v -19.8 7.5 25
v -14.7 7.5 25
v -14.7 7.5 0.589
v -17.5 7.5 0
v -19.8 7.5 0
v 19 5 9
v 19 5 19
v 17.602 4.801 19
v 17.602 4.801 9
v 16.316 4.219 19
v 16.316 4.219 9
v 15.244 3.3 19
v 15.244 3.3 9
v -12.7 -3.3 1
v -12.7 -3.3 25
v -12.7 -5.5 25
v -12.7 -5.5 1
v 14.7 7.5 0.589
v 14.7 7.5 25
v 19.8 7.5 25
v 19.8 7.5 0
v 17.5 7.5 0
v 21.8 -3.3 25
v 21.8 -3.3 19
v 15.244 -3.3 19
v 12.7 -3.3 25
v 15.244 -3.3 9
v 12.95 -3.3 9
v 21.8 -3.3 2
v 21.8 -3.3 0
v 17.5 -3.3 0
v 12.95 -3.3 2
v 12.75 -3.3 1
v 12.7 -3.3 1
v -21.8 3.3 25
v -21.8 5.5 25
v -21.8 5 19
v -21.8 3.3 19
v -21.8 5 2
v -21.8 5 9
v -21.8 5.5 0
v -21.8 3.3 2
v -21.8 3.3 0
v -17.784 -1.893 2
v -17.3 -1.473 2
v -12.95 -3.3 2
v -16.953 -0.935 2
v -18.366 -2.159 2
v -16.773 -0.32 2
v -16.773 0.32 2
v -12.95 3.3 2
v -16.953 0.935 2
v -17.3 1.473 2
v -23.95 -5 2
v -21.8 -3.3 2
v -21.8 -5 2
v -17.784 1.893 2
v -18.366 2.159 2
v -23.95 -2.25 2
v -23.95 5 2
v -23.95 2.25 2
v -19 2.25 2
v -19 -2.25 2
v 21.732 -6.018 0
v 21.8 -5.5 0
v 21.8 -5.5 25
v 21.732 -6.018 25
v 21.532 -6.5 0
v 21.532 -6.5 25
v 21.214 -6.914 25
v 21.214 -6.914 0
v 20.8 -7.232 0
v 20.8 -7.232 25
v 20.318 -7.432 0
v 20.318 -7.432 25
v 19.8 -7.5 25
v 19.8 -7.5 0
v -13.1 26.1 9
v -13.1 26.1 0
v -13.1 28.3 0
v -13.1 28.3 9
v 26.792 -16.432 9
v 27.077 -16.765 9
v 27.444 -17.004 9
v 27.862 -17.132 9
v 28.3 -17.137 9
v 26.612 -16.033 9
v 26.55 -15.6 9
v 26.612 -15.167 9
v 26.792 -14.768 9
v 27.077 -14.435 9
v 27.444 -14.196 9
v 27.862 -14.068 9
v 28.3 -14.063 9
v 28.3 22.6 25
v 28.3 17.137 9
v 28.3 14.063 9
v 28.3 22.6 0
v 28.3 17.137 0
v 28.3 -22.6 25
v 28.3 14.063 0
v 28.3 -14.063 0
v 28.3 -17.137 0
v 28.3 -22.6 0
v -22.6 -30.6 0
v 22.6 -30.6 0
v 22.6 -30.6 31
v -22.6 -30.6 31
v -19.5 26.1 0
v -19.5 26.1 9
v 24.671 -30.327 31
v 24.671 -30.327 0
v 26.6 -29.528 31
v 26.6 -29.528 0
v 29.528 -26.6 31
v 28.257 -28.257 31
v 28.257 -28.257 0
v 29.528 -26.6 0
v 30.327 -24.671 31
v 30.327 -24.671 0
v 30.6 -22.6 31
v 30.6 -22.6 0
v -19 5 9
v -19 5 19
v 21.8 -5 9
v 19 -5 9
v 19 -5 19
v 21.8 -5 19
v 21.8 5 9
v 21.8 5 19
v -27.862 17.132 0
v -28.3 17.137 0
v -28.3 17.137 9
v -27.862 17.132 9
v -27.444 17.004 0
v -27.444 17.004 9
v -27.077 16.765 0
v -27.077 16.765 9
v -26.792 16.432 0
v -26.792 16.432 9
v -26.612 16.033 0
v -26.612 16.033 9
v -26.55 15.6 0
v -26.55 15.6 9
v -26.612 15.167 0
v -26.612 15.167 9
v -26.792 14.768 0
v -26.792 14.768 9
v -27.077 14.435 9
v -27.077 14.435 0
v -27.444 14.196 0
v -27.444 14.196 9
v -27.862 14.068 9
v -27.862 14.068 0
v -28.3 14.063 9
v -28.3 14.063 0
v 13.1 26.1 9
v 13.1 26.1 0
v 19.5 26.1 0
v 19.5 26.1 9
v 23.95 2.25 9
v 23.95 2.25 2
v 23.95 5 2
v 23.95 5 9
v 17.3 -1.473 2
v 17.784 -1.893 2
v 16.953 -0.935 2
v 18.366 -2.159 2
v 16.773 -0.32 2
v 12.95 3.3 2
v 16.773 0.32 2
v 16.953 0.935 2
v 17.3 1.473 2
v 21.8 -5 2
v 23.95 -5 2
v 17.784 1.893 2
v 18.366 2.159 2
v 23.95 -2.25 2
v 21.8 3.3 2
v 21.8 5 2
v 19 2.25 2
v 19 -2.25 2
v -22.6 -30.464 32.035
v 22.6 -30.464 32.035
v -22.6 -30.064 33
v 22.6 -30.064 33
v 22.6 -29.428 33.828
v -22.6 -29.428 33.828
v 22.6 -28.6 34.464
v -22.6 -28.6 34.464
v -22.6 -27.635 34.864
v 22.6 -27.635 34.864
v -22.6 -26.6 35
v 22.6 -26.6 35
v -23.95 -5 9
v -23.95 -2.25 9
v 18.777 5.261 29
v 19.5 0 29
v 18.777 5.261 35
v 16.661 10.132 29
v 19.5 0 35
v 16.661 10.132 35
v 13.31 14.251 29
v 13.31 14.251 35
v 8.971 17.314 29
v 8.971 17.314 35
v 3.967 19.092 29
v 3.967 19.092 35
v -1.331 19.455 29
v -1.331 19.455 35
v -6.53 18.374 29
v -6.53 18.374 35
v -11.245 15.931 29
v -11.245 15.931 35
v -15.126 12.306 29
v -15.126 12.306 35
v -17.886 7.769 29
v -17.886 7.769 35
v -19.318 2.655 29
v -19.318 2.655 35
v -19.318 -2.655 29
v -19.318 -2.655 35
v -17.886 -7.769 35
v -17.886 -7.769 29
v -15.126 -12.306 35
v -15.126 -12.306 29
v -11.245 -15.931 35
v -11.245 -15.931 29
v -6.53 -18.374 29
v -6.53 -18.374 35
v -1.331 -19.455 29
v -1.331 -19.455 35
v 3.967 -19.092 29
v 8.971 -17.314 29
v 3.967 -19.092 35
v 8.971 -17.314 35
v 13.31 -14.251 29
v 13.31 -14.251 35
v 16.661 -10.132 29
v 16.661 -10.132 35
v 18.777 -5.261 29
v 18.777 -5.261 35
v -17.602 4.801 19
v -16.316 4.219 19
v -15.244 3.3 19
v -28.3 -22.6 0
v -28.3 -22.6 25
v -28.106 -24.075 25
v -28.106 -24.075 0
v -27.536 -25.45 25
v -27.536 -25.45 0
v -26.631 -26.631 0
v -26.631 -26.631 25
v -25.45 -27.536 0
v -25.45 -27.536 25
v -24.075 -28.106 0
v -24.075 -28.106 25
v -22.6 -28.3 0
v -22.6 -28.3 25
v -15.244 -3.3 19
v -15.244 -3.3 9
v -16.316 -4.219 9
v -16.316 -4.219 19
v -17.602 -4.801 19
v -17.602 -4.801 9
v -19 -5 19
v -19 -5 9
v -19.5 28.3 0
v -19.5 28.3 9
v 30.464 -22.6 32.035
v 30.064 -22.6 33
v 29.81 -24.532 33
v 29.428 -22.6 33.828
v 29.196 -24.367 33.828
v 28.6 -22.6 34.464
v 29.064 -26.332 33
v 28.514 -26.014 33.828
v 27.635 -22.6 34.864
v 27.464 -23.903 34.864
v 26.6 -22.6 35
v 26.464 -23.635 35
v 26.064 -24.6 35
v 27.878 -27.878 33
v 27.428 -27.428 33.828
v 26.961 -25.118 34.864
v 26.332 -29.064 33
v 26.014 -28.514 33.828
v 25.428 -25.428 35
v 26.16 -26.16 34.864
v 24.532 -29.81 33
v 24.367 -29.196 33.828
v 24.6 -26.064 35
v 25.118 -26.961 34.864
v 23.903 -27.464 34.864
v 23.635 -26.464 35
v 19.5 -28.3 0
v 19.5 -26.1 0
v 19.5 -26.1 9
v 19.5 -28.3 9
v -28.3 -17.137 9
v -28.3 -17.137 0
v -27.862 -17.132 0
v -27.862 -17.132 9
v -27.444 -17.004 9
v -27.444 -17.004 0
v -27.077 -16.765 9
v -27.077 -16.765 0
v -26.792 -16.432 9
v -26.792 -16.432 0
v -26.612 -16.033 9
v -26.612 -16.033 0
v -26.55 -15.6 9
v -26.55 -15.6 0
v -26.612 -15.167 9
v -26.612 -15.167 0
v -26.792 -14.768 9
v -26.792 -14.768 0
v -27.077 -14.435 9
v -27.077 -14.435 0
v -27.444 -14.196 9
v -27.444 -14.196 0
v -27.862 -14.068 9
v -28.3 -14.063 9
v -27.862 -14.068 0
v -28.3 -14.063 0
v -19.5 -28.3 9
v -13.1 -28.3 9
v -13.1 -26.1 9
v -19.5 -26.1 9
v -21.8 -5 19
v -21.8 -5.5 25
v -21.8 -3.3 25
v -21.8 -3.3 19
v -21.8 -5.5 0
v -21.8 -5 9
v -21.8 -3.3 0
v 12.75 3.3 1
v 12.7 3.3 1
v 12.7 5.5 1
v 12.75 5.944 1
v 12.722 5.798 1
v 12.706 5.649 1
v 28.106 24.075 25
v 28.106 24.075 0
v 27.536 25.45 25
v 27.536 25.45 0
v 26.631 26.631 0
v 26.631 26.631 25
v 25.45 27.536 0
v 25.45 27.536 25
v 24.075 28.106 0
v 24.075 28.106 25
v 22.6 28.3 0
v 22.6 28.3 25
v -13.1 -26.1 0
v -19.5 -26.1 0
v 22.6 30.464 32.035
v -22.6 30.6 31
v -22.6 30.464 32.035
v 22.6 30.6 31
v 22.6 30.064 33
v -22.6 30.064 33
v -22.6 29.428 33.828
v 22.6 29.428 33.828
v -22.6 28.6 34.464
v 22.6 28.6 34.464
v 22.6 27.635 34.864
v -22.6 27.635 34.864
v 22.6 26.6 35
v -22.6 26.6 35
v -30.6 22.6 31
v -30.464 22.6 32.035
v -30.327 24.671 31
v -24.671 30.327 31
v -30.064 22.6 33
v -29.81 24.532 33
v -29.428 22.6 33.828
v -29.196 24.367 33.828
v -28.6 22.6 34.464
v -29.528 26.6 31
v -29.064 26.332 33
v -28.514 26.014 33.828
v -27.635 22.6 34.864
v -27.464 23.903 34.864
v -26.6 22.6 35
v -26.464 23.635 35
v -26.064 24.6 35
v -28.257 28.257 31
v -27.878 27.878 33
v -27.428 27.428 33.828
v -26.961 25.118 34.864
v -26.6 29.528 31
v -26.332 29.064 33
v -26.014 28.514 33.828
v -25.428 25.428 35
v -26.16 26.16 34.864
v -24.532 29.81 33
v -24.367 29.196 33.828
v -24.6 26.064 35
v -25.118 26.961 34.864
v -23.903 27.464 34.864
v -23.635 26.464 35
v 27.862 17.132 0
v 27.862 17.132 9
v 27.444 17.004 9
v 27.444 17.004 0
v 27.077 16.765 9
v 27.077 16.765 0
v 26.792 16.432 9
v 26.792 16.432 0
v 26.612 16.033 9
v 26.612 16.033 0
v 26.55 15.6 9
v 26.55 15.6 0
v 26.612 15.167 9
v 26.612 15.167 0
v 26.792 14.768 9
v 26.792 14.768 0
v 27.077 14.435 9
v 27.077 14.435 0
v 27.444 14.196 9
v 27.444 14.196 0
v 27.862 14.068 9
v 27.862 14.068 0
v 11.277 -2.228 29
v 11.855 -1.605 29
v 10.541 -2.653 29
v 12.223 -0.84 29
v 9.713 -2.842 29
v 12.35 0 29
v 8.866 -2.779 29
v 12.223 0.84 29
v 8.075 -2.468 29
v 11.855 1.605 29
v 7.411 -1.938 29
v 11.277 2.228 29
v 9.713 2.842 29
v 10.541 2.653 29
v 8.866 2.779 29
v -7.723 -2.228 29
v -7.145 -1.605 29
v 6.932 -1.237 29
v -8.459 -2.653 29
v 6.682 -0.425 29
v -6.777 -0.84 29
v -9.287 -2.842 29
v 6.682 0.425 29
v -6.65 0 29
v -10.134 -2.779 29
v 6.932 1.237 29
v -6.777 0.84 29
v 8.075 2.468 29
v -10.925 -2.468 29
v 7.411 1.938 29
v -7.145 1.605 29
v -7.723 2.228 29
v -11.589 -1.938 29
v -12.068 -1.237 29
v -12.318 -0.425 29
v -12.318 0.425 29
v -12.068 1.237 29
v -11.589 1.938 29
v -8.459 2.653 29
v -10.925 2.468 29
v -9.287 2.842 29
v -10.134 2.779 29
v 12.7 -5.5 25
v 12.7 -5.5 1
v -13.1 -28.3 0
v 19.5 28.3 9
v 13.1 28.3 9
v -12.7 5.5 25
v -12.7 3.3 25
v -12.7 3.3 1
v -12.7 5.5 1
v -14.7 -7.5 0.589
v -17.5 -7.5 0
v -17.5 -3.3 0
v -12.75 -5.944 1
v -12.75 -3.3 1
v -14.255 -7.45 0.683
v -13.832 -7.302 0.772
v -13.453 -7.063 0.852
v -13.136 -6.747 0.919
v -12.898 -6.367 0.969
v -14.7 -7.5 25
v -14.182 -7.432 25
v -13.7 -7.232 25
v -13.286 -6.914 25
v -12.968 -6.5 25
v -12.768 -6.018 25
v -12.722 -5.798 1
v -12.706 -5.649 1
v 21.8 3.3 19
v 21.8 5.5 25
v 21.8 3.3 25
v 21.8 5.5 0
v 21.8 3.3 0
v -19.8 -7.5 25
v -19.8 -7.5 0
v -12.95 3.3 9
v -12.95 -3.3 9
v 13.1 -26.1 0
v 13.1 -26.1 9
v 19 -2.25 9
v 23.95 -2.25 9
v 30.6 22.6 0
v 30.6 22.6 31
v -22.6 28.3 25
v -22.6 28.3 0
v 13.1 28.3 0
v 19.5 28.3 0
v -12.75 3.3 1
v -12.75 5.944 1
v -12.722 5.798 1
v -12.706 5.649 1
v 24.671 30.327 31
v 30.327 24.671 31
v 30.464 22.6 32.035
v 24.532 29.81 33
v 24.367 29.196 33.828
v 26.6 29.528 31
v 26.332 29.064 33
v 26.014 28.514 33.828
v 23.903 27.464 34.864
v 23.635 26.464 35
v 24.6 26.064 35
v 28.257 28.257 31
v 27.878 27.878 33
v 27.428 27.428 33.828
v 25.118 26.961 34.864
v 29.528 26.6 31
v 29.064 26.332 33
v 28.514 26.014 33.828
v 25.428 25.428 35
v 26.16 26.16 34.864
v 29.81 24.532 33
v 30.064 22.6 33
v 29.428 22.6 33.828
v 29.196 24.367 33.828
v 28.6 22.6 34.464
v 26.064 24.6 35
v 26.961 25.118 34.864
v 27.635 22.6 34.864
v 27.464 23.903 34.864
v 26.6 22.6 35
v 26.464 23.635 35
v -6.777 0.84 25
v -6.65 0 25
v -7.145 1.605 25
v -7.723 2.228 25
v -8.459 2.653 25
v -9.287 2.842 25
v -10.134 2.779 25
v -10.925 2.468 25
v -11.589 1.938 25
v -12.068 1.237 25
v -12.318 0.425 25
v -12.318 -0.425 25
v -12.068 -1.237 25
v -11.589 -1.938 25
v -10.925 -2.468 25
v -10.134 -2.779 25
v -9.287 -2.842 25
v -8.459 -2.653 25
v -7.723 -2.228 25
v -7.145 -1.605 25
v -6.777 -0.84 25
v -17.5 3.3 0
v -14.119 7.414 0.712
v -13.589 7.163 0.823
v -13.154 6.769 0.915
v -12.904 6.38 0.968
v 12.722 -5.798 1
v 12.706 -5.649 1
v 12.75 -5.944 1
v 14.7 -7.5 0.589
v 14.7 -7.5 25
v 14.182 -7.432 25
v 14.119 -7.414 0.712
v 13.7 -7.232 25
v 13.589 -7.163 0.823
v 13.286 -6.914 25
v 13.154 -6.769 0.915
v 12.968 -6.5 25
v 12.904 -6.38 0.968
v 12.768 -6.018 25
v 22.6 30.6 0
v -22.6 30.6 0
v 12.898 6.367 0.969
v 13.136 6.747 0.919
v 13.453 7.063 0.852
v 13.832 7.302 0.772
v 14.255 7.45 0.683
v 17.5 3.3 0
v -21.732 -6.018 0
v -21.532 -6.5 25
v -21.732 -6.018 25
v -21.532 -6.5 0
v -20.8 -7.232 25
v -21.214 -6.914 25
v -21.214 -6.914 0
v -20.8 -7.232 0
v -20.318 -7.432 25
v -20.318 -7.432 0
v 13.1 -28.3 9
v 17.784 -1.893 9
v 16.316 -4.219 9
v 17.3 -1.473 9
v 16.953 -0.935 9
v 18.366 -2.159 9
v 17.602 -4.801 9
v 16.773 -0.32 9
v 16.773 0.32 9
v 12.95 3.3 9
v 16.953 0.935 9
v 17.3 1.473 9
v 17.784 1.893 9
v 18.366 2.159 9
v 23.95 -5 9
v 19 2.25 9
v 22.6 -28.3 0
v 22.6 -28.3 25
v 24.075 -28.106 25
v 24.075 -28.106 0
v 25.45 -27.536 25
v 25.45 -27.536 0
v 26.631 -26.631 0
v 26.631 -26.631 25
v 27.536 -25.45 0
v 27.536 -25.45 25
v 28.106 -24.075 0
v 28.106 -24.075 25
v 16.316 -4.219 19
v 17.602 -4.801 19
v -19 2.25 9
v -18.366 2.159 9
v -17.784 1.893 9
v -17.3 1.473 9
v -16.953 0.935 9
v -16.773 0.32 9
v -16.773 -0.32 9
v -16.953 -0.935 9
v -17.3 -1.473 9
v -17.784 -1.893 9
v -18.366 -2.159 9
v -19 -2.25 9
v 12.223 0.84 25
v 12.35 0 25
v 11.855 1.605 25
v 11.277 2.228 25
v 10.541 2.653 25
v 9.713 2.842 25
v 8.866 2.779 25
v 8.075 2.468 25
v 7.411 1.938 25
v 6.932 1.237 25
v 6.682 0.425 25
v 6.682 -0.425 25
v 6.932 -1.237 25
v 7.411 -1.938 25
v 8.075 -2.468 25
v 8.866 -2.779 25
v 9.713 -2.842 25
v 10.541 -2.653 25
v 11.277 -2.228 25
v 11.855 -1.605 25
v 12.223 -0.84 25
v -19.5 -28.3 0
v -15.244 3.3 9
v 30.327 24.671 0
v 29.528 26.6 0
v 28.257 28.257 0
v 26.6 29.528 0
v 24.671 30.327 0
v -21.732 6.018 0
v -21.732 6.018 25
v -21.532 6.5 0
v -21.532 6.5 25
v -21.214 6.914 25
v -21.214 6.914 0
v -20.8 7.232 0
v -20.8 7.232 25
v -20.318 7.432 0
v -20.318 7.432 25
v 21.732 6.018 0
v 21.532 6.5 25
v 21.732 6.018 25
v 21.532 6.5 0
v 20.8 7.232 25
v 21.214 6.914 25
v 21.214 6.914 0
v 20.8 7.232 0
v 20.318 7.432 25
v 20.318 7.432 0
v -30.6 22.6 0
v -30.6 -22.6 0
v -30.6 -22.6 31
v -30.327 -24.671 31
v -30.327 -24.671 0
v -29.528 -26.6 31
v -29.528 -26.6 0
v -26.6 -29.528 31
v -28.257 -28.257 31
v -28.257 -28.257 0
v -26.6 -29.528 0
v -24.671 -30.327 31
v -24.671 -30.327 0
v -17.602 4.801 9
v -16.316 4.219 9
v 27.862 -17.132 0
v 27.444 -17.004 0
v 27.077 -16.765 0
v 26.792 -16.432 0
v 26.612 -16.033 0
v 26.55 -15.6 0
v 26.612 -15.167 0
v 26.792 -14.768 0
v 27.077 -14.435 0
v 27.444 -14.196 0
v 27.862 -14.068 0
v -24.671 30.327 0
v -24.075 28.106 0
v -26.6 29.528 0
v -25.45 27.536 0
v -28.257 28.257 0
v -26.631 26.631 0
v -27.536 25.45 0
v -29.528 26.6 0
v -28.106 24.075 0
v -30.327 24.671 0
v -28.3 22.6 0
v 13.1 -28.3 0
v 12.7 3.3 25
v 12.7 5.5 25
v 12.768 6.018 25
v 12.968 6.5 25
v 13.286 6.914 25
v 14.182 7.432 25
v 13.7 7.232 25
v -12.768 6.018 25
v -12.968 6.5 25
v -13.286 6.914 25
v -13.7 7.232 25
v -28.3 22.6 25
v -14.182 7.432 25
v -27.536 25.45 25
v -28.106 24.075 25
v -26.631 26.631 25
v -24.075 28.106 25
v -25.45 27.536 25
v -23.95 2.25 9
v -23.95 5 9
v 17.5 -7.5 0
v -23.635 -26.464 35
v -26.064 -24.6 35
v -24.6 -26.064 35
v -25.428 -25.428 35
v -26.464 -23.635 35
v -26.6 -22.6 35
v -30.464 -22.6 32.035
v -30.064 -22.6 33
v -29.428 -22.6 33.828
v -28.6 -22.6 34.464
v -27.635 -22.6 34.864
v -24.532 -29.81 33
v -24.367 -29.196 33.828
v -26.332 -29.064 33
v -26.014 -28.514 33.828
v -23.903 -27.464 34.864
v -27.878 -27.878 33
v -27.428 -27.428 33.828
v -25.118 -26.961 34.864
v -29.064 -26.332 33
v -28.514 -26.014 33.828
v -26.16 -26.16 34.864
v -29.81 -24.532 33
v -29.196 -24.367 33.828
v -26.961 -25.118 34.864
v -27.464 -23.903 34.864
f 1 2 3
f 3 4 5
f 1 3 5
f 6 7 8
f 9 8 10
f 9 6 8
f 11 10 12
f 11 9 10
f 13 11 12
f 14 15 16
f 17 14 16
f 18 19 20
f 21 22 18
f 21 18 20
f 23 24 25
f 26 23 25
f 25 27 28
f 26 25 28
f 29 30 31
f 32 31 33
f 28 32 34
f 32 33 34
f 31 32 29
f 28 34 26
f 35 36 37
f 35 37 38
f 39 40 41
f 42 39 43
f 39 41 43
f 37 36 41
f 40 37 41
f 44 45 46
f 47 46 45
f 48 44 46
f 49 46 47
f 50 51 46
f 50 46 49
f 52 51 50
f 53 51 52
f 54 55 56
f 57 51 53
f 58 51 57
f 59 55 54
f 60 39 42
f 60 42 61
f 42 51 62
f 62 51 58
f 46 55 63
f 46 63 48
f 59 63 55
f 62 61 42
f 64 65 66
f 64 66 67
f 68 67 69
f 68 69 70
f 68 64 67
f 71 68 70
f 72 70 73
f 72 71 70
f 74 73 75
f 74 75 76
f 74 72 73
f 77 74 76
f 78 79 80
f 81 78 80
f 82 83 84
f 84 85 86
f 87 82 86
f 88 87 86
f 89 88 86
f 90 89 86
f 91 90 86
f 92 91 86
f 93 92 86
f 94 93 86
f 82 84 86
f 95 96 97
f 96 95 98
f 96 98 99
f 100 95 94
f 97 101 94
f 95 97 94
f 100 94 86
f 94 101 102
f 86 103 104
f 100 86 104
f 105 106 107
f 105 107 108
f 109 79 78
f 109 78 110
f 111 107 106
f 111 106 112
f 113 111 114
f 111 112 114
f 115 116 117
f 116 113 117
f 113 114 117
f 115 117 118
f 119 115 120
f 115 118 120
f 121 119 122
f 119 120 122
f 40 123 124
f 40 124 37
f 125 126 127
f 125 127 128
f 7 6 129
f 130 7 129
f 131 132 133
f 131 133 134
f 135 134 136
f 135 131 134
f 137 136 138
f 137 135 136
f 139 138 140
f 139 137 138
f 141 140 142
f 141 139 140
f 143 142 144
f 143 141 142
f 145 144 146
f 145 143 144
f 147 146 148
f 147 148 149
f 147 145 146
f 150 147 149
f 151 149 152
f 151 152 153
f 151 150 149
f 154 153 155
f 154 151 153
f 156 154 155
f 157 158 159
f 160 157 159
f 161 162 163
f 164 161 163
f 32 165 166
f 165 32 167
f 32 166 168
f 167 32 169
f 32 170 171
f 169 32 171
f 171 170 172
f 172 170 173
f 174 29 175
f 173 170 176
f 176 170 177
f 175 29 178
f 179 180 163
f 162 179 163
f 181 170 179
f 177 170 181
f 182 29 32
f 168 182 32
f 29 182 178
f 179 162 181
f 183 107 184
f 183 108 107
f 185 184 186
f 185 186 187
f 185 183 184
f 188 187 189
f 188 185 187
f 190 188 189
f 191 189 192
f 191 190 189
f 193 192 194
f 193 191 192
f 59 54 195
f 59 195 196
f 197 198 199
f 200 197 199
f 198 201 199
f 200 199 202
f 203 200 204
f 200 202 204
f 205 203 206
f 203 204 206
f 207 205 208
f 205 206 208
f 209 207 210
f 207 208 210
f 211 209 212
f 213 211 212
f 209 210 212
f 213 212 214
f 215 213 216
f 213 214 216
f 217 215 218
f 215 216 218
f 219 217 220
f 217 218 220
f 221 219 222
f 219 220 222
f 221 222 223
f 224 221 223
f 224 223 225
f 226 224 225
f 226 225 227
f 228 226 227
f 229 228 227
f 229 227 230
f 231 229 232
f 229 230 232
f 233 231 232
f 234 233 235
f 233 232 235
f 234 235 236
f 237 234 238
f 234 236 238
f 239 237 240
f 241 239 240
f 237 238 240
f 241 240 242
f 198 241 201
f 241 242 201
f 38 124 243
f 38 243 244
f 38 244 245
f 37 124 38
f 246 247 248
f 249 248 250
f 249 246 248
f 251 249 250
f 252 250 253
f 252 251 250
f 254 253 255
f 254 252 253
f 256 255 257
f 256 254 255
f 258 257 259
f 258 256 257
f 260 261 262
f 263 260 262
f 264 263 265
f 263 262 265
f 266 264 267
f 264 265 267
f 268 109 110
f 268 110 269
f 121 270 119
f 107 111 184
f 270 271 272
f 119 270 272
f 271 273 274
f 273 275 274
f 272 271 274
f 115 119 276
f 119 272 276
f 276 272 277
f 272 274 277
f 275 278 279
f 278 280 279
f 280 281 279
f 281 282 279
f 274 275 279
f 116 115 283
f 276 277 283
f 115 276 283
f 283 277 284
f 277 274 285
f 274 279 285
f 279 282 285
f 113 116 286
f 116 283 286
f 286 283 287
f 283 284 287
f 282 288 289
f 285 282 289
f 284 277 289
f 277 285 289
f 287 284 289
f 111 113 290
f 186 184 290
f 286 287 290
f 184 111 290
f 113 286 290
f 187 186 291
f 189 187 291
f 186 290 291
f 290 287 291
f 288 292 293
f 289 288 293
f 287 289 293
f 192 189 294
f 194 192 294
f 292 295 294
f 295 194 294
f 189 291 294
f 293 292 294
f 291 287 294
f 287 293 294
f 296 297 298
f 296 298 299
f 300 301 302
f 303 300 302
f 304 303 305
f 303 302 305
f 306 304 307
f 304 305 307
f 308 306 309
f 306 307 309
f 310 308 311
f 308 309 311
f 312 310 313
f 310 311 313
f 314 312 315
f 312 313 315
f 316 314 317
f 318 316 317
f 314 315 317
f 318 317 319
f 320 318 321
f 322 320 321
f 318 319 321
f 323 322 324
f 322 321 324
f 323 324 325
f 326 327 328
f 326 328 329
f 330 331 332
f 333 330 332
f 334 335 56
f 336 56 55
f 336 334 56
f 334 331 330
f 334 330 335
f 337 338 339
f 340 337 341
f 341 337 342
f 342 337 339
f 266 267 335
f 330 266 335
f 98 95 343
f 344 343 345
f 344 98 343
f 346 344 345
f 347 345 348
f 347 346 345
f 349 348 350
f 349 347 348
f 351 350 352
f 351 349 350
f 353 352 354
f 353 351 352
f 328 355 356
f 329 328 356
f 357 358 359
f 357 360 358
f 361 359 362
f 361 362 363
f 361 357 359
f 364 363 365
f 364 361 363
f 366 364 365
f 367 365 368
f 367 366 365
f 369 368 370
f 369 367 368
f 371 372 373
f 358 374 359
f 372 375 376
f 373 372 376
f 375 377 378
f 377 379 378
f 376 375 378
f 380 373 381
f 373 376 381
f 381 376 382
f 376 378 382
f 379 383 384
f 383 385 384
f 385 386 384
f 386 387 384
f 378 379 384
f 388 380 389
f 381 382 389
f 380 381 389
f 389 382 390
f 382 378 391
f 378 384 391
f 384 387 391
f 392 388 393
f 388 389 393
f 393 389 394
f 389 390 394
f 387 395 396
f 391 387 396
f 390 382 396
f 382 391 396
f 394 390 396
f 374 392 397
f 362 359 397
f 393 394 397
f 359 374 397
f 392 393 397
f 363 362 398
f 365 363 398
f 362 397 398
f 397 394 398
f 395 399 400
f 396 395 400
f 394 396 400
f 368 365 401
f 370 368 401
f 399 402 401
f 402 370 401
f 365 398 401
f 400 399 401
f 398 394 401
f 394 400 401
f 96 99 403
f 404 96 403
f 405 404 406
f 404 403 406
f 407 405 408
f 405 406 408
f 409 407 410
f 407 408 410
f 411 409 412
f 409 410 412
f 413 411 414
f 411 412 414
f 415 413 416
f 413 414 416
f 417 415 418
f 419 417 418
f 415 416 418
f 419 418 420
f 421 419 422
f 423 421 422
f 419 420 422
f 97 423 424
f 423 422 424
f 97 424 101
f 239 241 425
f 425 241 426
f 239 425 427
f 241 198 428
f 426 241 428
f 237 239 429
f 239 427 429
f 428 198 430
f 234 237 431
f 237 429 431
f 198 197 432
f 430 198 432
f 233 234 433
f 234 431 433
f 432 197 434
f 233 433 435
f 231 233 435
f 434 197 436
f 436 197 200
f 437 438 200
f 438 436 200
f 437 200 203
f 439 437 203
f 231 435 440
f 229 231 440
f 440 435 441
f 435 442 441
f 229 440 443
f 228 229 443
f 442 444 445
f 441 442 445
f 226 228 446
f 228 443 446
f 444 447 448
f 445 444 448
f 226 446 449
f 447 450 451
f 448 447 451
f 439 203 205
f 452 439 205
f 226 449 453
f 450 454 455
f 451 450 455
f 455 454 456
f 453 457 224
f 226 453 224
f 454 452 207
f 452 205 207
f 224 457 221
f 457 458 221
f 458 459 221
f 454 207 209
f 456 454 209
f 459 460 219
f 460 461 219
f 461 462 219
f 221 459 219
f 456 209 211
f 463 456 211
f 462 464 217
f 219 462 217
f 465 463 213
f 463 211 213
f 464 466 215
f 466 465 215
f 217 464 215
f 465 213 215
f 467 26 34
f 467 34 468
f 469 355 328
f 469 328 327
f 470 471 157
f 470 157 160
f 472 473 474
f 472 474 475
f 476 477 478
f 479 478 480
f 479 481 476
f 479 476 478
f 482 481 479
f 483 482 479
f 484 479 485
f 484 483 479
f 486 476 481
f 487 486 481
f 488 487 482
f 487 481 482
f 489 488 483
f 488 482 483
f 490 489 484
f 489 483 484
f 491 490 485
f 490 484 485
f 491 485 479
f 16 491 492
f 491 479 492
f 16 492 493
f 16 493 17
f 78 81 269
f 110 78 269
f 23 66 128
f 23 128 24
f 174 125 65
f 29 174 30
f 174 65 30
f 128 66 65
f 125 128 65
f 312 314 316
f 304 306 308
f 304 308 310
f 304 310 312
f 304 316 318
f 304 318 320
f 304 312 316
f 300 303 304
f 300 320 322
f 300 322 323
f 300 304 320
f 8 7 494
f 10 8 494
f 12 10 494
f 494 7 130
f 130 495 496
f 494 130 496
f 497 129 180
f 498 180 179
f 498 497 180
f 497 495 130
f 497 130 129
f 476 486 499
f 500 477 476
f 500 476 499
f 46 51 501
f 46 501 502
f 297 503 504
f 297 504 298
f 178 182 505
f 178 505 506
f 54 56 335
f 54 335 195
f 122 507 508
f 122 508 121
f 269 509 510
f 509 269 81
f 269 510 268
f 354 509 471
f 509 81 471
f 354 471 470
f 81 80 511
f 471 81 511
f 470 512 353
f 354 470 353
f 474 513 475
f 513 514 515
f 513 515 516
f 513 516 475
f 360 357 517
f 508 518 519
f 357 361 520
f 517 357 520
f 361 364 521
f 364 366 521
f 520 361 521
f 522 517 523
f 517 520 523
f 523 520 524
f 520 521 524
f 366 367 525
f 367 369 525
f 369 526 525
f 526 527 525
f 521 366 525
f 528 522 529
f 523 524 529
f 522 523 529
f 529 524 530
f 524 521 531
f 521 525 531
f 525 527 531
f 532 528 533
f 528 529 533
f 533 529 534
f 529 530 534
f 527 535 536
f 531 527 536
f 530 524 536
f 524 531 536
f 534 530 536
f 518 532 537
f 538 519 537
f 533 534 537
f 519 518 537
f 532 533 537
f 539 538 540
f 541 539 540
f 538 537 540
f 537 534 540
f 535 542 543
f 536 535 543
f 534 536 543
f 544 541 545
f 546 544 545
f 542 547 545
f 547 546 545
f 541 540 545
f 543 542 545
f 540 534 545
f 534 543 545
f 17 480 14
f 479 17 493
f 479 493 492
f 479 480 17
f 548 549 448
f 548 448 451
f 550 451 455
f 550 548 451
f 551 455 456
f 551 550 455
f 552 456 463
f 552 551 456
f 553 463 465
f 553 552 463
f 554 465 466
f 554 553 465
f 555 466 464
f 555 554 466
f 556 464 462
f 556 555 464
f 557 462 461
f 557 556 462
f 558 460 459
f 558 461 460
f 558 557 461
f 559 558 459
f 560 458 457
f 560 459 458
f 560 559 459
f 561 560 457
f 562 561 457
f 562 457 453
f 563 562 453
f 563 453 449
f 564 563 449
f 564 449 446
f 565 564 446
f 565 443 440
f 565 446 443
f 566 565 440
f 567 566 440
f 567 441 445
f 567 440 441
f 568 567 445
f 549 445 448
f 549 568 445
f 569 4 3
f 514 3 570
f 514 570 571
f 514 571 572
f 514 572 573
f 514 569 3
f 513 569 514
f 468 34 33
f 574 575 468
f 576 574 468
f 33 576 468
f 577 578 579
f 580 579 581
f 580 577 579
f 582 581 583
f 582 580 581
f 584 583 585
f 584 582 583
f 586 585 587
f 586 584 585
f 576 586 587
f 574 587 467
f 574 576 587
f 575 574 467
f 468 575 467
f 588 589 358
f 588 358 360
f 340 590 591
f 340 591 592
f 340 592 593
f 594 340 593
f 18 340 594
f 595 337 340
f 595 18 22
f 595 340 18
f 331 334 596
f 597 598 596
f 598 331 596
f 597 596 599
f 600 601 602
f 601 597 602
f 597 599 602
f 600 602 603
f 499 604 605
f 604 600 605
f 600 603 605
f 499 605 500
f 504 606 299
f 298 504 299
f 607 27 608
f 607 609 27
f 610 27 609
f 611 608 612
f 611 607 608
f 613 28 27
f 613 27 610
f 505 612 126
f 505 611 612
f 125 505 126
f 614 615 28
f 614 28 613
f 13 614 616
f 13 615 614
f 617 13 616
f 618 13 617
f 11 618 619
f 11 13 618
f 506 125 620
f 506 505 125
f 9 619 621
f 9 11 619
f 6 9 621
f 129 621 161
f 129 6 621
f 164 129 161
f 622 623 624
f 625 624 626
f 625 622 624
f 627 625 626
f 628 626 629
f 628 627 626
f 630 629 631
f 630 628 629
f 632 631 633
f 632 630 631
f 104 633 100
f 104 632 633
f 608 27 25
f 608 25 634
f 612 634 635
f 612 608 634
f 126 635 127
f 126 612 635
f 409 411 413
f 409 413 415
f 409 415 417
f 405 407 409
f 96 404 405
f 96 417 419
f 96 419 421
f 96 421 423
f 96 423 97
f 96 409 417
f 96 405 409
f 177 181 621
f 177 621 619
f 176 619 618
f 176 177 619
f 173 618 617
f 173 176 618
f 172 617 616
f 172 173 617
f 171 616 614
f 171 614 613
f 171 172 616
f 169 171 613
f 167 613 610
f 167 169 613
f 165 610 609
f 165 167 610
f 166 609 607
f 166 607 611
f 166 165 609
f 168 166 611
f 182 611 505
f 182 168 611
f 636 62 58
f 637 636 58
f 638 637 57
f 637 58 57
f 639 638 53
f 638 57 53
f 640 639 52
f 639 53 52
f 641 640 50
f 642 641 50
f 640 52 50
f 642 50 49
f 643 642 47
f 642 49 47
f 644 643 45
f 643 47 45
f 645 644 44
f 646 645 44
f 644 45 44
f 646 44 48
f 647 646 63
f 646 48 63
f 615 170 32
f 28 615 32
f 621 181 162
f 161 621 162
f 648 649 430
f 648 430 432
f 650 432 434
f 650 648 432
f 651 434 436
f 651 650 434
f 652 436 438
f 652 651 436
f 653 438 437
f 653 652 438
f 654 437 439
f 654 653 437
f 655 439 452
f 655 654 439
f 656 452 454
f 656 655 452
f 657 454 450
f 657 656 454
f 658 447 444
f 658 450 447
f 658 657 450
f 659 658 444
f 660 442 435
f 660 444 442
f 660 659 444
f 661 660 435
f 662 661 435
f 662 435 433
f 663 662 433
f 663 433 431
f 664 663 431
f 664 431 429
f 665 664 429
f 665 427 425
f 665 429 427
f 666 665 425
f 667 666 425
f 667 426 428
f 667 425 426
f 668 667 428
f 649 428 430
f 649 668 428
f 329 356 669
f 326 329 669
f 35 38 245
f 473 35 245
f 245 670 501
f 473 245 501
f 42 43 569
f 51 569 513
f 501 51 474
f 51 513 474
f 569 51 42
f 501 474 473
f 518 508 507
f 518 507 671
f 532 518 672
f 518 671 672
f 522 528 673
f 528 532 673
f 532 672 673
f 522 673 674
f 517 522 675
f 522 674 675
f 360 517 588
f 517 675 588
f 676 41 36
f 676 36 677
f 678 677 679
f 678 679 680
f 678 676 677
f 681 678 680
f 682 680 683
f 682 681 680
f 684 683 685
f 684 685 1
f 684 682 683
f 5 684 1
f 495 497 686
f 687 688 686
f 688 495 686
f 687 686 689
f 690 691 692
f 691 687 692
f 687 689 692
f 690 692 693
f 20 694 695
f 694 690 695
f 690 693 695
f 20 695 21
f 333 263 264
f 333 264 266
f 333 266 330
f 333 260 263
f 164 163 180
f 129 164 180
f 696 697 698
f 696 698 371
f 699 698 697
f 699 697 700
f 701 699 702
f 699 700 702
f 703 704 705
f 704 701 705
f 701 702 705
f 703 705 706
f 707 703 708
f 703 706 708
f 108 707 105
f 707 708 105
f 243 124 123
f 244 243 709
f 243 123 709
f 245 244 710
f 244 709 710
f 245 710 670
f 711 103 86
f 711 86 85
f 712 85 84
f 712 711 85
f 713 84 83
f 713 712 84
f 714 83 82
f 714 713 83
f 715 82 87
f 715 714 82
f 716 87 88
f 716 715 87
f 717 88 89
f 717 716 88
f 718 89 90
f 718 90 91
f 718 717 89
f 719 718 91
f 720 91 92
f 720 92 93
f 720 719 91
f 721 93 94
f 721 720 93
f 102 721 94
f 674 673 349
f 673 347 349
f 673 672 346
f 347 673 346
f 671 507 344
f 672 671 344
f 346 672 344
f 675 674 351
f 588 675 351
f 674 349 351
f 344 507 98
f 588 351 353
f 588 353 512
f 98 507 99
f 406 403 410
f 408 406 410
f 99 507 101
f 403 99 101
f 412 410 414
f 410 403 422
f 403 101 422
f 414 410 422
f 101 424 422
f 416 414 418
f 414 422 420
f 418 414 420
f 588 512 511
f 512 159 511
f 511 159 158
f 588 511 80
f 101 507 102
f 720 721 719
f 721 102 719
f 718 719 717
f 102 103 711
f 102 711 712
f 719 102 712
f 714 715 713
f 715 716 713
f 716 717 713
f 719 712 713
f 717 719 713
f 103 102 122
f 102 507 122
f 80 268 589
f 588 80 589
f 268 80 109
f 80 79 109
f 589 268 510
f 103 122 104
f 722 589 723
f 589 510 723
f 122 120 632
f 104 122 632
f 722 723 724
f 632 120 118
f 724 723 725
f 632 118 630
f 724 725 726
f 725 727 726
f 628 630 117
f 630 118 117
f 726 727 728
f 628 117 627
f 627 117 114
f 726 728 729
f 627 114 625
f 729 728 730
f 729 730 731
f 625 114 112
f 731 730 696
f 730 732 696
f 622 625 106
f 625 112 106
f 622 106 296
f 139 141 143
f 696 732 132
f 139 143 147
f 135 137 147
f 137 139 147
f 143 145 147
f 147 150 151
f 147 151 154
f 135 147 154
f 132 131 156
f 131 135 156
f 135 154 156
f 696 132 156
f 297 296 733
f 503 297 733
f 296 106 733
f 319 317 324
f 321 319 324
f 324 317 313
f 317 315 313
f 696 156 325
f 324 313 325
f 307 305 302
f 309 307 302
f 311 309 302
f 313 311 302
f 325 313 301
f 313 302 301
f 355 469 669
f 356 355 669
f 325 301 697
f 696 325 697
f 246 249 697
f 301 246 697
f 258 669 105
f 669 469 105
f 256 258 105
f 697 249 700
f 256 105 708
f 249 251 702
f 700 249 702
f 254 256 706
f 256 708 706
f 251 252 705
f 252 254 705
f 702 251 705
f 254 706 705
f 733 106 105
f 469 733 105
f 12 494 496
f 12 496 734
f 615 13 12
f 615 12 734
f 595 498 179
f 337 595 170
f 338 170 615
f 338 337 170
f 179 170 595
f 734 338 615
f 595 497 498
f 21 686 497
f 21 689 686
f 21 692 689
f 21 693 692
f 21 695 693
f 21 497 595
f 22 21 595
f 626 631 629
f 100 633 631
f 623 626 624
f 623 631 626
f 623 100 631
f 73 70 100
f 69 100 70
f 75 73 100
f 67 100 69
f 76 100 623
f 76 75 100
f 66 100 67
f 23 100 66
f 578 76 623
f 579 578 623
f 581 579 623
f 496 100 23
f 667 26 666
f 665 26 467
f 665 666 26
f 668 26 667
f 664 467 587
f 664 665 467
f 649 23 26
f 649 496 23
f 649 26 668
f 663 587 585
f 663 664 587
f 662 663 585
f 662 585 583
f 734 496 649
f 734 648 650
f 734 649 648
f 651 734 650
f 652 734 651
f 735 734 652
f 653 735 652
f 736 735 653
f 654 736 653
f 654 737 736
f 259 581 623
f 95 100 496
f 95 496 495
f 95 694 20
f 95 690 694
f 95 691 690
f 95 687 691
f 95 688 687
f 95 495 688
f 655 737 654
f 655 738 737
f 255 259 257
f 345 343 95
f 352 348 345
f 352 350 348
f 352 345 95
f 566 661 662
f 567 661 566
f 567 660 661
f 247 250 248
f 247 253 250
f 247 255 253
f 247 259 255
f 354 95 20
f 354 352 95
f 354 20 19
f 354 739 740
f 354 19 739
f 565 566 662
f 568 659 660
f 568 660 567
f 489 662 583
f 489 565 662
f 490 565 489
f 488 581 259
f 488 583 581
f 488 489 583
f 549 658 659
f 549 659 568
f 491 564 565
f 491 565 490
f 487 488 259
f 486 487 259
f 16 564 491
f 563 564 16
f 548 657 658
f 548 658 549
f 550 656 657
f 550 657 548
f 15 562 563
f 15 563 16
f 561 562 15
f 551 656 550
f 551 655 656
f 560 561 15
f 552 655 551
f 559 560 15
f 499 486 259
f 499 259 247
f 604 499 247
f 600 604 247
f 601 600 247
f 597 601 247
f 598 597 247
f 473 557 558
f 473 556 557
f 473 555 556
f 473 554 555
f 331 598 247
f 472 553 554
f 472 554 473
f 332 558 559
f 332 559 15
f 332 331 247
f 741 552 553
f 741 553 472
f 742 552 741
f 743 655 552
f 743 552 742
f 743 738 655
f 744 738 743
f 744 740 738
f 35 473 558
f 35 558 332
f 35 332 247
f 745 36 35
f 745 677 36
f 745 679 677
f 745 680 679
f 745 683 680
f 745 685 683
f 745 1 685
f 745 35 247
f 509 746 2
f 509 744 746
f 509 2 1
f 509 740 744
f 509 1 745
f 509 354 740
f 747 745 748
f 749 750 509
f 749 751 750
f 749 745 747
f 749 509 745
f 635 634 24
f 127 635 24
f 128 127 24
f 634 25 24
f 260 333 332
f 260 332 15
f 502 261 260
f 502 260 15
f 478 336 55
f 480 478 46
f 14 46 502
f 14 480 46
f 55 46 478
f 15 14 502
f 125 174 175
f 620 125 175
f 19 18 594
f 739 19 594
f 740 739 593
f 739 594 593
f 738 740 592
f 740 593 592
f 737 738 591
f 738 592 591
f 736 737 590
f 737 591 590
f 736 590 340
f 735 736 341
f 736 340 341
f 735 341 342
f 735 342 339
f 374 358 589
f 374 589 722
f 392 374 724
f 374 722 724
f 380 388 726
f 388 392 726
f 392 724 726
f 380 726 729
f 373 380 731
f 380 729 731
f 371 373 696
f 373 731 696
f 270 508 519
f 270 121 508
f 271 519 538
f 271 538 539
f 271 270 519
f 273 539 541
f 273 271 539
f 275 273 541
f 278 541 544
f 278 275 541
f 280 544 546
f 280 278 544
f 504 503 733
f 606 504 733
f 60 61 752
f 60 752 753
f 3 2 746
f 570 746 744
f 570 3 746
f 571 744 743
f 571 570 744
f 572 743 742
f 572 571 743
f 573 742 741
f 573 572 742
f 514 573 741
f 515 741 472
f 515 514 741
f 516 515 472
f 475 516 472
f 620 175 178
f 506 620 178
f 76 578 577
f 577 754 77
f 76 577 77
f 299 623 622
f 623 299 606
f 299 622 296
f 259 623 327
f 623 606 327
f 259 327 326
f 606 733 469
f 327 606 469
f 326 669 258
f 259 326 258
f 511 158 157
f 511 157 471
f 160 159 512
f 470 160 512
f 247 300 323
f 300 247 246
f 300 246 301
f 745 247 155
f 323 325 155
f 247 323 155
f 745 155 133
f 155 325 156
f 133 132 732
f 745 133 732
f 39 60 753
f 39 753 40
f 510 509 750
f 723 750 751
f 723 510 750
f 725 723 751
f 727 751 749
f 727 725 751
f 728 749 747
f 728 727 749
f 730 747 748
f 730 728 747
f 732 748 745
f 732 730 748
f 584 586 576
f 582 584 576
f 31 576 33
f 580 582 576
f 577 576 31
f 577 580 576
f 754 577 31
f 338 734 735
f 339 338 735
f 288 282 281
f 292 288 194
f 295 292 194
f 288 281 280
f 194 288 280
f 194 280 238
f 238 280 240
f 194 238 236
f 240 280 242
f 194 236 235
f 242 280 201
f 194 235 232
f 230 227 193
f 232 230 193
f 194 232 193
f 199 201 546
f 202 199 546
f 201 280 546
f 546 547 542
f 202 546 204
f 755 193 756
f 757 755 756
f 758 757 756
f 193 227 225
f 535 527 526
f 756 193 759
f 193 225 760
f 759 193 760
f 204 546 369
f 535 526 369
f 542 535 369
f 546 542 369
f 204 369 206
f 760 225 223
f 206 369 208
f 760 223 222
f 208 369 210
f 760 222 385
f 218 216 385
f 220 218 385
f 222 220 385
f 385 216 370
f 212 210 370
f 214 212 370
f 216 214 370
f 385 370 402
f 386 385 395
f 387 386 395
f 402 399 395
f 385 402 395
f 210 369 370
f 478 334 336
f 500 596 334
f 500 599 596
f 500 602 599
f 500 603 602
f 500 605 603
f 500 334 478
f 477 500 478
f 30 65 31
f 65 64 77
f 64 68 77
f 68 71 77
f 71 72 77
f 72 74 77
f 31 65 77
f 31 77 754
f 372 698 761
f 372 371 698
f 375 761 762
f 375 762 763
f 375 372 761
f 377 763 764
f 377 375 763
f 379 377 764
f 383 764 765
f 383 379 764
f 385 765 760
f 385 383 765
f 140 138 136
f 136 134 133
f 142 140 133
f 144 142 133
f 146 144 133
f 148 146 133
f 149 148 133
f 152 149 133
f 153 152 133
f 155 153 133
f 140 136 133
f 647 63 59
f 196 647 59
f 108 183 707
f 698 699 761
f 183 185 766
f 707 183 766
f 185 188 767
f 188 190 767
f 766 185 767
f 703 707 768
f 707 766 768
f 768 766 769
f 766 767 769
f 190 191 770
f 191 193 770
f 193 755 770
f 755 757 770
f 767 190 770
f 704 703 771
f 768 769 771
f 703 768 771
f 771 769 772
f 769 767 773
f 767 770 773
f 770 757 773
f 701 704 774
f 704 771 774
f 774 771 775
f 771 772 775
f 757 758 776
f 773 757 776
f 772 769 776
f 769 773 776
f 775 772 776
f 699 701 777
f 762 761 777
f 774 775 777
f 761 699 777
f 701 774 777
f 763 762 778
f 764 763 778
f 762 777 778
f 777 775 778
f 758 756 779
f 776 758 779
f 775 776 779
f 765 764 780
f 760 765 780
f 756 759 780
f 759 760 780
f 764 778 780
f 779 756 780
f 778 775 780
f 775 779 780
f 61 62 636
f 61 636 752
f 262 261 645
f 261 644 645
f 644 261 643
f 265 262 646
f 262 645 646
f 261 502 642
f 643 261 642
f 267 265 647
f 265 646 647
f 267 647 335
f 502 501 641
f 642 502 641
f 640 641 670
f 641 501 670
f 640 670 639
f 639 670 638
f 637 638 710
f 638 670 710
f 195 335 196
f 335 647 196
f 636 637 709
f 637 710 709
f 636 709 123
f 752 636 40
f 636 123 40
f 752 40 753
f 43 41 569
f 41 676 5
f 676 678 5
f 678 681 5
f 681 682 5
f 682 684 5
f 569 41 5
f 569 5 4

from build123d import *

# Parameters (mm, degrees)
PAD_DEPTH               = 35
POCKET_DEPTH            = 25
SKETCH002_W             = 6.4
SKETCH002_H             = 2.5
PAD001_DEPTH            = 9
SKETCH003_R             = 1.55
PAD002_DEPTH            = 9
PAD003_DEPTH            = 33
SKETCH002_MIRRORED_2_W  = 6.4
SKETCH002_MIRRORED_2_H  = 2.5
PAD001_MIRRORED_2_DEPTH = 9
PAD003_MIRRORED_2_DEPTH = 33
SKETCH003_MIRRORED_2_R  = 1.55
PAD002_MIRRORED_2_DEPTH = 9
POCKET001_DEPTH         = 10
PAD004_DEPTH            = 7
POCKET002_DEPTH         = 10
SKETCH008_W             = 19.5
SKETCH008_H             = 6
SKETCH009_R             = 2.85
POCKET003_DEPTH         = 0.001
POCKET003_DEPTH_BACK    = -35.001
FILLET_R                = 4


with BuildPart() as part:
    # Sketch → Pad (new body)
    with BuildSketch(Plane.XY):
        with BuildLine():
            Line((-22.6, 30.6), (22.6, 30.6))
            ThreePointArc((30.6, 22.6), (28.256854, 28.256854), (22.6, 30.6))
            Line((30.6, 22.6), (30.6, -22.6))
            ThreePointArc((22.6, -30.6), (28.256854, -28.256854), (30.6, -22.6))
            Line((22.6, -30.6), (-22.6, -30.6))
            ThreePointArc((-30.6, -22.6), (-28.256854, -28.256854), (-22.6, -30.6))
            Line((-30.6, -22.6), (-30.6, 22.6))
            ThreePointArc((-22.6, 30.6), (-28.256854, 28.256854), (-30.6, 22.6))
        make_face()
    extrude(amount=PAD_DEPTH)

    # Sketch001 → Pocket (cut)
    with BuildSketch(Plane.XY):
        with BuildLine():
            Line((-22.6, 28.3), (22.6, 28.3))
            ThreePointArc((28.3, 22.6), (26.630509, 26.630509), (22.6, 28.3))
            Line((28.3, 22.6), (28.3, -22.6))
            ThreePointArc((22.6, -28.3), (26.630509, -26.630509), (28.3, -22.6))
            Line((22.6, -28.3), (-22.6, -28.3))
            ThreePointArc((-28.3, -22.6), (-26.630509, -26.630509), (-22.6, -28.3))
            Line((-28.3, -22.6), (-28.3, 22.6))
            ThreePointArc((-22.6, 28.3), (-26.630509, 26.630509), (-28.3, 22.6))
        make_face()
    extrude(amount=POCKET_DEPTH, mode=Mode.SUBTRACT)

    # Sketch002 → Pad001 (join)
    with BuildSketch(Plane.XY):
        with Locations((16.3, 27.35)):
            Rectangle(SKETCH002_W, SKETCH002_H)
    pad001 = extrude(amount=PAD001_DEPTH)

    # Sketch003 → Pad002 (join)
    with BuildSketch(Plane.XY):
        with Locations((28.1, 15.6)):
            Circle(SKETCH003_R)
    pad002 = extrude(amount=PAD002_DEPTH)

    # Sketch004 → Pad003 (join)
    with BuildSketch(Plane.XY):
        with BuildLine():
            Line((21.8, 3.3), (12.7, 3.3))
            Line((12.7, 3.3), (12.7, 5.5))
            ThreePointArc((14.7, 7.5), (13.285786, 6.914214), (12.7, 5.5))
            Line((14.7, 7.5), (19.8, 7.5))
            ThreePointArc((21.8, 5.5), (21.214214, 6.914214), (19.8, 7.5))
            Line((21.8, 5.5), (21.8, 3.3))
        make_face()
    pad003 = extrude(amount=PAD003_DEPTH)

    # Sketch002 Mirrored 2 → Pad001 Mirrored 2 (add)
    with BuildSketch(Plane(origin=(0, 0, 0), x_dir=(-1, 0, 0), z_dir=(0, 0, -1))):
        with Locations((16.3, 27.35)):
            Rectangle(SKETCH002_MIRRORED_2_W, SKETCH002_MIRRORED_2_H)
    pad001_mirrored_2 = extrude(amount=-PAD001_MIRRORED_2_DEPTH)

    # Sketch004 Mirrored 2 → Pad003 Mirrored 2 (add)
    with BuildSketch(Plane(origin=(0, 0, 0), x_dir=(-1, 0, 0), z_dir=(0, 0, -1))):
        with BuildLine():
            Line((21.8, 3.3), (12.7, 3.3))
            Line((12.7, 3.3), (12.7, 5.5))
            ThreePointArc((14.7, 7.5), (13.285786, 6.914214), (12.7, 5.5))
            Line((14.7, 7.5), (19.8, 7.5))
            ThreePointArc((21.8, 5.5), (21.214214, 6.914214), (19.8, 7.5))
            Line((21.8, 5.5), (21.8, 3.3))
        make_face()
    pad003_mirrored_2 = extrude(amount=-PAD003_MIRRORED_2_DEPTH)

    # Sketch003 Mirrored 2 → Pad002 Mirrored 2 (add)
    with BuildSketch(Plane(origin=(0, 0, 0), x_dir=(-1, 0, 0), z_dir=(0, 0, -1))):
        with Locations((28.1, 15.6)):
            Circle(SKETCH003_MIRRORED_2_R)
    pad002_mirrored_2 = extrude(amount=-PAD002_MIRRORED_2_DEPTH)

    # Mirrored001: Pad001, Pad003, Pad002, Pad001 Mirrored 2, Pad003 Mirrored 2, Pad002 Mirrored 2 across XZ
    add(pad001.mirror(Plane.XZ))
    add(pad003.mirror(Plane.XZ))
    add(pad002.mirror(Plane.XZ))
    add(pad001_mirrored_2.mirror(Plane.XZ))
    add(pad003_mirrored_2.mirror(Plane.XZ))
    add(pad002_mirrored_2.mirror(Plane.XZ))

    # Sketch005 → Pocket001 (cut, symmetric)
    with BuildSketch(Plane.XZ):
        Polygon((-12.75, 1), (12.75, 1), (17.5, 0), (-17.5, 0), align=None)
    extrude(amount=POCKET001_DEPTH, both=True, mode=Mode.SUBTRACT)

    # Sketch006 → Pad004 (join)
    with BuildSketch(Plane.XY.offset(2)):
        with BuildLine():
            Line((23.95, 5), (12.95, 5))
            Line((12.95, 5), (12.95, -5))
            Line((12.95, -5), (23.95, -5))
            Line((23.95, -5), (23.95, -2.25))
            Line((19, -2.25), (23.95, -2.25))
            ThreePointArc((19, 2.25), (16.75, 0), (19, -2.25))
            Line((19, 2.25), (23.95, 2.25))
            Line((23.95, 2.25), (23.95, 5))
        make_face()
    pad004 = extrude(amount=PAD004_DEPTH)

    # Sketch007 → Pocket002 (cut)
    with BuildSketch(Plane.XY.offset(9)):
        with BuildLine():
            ThreePointArc((19, 5), (14, 0), (19, -5))
            Line((19, -5), (25, -5))
            Line((25, 5), (25, -5))
            Line((19, 5), (25, 5))
        make_face()
    pocket002 = extrude(amount=POCKET002_DEPTH, mode=Mode.SUBTRACT)

    # Mirrored002: Pad004, Pocket002 across YZ
    add(pad004.mirror(Plane.YZ))
    add(pocket002.mirror(Plane.YZ), mode=Mode.SUBTRACT)

    # Sketch008 → Groove (revolve, cut)
    with BuildSketch(Plane.XZ):
        with Locations((9.75, 32)):
            Rectangle(SKETCH008_W, SKETCH008_H)
    revolve(axis=Axis((0, 0, 0), (0, 0, 1)), mode=Mode.SUBTRACT)

    # Sketch009 → Pocket003 (cut, two sides)
    with BuildSketch(Plane.XY) as pocket003_sk:
        with Locations((9.5, 0)):
            Circle(SKETCH009_R)
        with Locations((-9.5, 0)):
            Circle(SKETCH009_R)
    extrude(amount=-POCKET003_DEPTH, mode=Mode.SUBTRACT)
    extrude(pocket003_sk.sketch, amount=-POCKET003_DEPTH_BACK, mode=Mode.SUBTRACT)

    # Fillet
    fillet_edges = [part.edges().sort_by_distance(p)[0] for p in [
        (0, -30.6, 35),
    ]]
    fillet(fillet_edges, radius=FILLET_R)


solid = part.part
